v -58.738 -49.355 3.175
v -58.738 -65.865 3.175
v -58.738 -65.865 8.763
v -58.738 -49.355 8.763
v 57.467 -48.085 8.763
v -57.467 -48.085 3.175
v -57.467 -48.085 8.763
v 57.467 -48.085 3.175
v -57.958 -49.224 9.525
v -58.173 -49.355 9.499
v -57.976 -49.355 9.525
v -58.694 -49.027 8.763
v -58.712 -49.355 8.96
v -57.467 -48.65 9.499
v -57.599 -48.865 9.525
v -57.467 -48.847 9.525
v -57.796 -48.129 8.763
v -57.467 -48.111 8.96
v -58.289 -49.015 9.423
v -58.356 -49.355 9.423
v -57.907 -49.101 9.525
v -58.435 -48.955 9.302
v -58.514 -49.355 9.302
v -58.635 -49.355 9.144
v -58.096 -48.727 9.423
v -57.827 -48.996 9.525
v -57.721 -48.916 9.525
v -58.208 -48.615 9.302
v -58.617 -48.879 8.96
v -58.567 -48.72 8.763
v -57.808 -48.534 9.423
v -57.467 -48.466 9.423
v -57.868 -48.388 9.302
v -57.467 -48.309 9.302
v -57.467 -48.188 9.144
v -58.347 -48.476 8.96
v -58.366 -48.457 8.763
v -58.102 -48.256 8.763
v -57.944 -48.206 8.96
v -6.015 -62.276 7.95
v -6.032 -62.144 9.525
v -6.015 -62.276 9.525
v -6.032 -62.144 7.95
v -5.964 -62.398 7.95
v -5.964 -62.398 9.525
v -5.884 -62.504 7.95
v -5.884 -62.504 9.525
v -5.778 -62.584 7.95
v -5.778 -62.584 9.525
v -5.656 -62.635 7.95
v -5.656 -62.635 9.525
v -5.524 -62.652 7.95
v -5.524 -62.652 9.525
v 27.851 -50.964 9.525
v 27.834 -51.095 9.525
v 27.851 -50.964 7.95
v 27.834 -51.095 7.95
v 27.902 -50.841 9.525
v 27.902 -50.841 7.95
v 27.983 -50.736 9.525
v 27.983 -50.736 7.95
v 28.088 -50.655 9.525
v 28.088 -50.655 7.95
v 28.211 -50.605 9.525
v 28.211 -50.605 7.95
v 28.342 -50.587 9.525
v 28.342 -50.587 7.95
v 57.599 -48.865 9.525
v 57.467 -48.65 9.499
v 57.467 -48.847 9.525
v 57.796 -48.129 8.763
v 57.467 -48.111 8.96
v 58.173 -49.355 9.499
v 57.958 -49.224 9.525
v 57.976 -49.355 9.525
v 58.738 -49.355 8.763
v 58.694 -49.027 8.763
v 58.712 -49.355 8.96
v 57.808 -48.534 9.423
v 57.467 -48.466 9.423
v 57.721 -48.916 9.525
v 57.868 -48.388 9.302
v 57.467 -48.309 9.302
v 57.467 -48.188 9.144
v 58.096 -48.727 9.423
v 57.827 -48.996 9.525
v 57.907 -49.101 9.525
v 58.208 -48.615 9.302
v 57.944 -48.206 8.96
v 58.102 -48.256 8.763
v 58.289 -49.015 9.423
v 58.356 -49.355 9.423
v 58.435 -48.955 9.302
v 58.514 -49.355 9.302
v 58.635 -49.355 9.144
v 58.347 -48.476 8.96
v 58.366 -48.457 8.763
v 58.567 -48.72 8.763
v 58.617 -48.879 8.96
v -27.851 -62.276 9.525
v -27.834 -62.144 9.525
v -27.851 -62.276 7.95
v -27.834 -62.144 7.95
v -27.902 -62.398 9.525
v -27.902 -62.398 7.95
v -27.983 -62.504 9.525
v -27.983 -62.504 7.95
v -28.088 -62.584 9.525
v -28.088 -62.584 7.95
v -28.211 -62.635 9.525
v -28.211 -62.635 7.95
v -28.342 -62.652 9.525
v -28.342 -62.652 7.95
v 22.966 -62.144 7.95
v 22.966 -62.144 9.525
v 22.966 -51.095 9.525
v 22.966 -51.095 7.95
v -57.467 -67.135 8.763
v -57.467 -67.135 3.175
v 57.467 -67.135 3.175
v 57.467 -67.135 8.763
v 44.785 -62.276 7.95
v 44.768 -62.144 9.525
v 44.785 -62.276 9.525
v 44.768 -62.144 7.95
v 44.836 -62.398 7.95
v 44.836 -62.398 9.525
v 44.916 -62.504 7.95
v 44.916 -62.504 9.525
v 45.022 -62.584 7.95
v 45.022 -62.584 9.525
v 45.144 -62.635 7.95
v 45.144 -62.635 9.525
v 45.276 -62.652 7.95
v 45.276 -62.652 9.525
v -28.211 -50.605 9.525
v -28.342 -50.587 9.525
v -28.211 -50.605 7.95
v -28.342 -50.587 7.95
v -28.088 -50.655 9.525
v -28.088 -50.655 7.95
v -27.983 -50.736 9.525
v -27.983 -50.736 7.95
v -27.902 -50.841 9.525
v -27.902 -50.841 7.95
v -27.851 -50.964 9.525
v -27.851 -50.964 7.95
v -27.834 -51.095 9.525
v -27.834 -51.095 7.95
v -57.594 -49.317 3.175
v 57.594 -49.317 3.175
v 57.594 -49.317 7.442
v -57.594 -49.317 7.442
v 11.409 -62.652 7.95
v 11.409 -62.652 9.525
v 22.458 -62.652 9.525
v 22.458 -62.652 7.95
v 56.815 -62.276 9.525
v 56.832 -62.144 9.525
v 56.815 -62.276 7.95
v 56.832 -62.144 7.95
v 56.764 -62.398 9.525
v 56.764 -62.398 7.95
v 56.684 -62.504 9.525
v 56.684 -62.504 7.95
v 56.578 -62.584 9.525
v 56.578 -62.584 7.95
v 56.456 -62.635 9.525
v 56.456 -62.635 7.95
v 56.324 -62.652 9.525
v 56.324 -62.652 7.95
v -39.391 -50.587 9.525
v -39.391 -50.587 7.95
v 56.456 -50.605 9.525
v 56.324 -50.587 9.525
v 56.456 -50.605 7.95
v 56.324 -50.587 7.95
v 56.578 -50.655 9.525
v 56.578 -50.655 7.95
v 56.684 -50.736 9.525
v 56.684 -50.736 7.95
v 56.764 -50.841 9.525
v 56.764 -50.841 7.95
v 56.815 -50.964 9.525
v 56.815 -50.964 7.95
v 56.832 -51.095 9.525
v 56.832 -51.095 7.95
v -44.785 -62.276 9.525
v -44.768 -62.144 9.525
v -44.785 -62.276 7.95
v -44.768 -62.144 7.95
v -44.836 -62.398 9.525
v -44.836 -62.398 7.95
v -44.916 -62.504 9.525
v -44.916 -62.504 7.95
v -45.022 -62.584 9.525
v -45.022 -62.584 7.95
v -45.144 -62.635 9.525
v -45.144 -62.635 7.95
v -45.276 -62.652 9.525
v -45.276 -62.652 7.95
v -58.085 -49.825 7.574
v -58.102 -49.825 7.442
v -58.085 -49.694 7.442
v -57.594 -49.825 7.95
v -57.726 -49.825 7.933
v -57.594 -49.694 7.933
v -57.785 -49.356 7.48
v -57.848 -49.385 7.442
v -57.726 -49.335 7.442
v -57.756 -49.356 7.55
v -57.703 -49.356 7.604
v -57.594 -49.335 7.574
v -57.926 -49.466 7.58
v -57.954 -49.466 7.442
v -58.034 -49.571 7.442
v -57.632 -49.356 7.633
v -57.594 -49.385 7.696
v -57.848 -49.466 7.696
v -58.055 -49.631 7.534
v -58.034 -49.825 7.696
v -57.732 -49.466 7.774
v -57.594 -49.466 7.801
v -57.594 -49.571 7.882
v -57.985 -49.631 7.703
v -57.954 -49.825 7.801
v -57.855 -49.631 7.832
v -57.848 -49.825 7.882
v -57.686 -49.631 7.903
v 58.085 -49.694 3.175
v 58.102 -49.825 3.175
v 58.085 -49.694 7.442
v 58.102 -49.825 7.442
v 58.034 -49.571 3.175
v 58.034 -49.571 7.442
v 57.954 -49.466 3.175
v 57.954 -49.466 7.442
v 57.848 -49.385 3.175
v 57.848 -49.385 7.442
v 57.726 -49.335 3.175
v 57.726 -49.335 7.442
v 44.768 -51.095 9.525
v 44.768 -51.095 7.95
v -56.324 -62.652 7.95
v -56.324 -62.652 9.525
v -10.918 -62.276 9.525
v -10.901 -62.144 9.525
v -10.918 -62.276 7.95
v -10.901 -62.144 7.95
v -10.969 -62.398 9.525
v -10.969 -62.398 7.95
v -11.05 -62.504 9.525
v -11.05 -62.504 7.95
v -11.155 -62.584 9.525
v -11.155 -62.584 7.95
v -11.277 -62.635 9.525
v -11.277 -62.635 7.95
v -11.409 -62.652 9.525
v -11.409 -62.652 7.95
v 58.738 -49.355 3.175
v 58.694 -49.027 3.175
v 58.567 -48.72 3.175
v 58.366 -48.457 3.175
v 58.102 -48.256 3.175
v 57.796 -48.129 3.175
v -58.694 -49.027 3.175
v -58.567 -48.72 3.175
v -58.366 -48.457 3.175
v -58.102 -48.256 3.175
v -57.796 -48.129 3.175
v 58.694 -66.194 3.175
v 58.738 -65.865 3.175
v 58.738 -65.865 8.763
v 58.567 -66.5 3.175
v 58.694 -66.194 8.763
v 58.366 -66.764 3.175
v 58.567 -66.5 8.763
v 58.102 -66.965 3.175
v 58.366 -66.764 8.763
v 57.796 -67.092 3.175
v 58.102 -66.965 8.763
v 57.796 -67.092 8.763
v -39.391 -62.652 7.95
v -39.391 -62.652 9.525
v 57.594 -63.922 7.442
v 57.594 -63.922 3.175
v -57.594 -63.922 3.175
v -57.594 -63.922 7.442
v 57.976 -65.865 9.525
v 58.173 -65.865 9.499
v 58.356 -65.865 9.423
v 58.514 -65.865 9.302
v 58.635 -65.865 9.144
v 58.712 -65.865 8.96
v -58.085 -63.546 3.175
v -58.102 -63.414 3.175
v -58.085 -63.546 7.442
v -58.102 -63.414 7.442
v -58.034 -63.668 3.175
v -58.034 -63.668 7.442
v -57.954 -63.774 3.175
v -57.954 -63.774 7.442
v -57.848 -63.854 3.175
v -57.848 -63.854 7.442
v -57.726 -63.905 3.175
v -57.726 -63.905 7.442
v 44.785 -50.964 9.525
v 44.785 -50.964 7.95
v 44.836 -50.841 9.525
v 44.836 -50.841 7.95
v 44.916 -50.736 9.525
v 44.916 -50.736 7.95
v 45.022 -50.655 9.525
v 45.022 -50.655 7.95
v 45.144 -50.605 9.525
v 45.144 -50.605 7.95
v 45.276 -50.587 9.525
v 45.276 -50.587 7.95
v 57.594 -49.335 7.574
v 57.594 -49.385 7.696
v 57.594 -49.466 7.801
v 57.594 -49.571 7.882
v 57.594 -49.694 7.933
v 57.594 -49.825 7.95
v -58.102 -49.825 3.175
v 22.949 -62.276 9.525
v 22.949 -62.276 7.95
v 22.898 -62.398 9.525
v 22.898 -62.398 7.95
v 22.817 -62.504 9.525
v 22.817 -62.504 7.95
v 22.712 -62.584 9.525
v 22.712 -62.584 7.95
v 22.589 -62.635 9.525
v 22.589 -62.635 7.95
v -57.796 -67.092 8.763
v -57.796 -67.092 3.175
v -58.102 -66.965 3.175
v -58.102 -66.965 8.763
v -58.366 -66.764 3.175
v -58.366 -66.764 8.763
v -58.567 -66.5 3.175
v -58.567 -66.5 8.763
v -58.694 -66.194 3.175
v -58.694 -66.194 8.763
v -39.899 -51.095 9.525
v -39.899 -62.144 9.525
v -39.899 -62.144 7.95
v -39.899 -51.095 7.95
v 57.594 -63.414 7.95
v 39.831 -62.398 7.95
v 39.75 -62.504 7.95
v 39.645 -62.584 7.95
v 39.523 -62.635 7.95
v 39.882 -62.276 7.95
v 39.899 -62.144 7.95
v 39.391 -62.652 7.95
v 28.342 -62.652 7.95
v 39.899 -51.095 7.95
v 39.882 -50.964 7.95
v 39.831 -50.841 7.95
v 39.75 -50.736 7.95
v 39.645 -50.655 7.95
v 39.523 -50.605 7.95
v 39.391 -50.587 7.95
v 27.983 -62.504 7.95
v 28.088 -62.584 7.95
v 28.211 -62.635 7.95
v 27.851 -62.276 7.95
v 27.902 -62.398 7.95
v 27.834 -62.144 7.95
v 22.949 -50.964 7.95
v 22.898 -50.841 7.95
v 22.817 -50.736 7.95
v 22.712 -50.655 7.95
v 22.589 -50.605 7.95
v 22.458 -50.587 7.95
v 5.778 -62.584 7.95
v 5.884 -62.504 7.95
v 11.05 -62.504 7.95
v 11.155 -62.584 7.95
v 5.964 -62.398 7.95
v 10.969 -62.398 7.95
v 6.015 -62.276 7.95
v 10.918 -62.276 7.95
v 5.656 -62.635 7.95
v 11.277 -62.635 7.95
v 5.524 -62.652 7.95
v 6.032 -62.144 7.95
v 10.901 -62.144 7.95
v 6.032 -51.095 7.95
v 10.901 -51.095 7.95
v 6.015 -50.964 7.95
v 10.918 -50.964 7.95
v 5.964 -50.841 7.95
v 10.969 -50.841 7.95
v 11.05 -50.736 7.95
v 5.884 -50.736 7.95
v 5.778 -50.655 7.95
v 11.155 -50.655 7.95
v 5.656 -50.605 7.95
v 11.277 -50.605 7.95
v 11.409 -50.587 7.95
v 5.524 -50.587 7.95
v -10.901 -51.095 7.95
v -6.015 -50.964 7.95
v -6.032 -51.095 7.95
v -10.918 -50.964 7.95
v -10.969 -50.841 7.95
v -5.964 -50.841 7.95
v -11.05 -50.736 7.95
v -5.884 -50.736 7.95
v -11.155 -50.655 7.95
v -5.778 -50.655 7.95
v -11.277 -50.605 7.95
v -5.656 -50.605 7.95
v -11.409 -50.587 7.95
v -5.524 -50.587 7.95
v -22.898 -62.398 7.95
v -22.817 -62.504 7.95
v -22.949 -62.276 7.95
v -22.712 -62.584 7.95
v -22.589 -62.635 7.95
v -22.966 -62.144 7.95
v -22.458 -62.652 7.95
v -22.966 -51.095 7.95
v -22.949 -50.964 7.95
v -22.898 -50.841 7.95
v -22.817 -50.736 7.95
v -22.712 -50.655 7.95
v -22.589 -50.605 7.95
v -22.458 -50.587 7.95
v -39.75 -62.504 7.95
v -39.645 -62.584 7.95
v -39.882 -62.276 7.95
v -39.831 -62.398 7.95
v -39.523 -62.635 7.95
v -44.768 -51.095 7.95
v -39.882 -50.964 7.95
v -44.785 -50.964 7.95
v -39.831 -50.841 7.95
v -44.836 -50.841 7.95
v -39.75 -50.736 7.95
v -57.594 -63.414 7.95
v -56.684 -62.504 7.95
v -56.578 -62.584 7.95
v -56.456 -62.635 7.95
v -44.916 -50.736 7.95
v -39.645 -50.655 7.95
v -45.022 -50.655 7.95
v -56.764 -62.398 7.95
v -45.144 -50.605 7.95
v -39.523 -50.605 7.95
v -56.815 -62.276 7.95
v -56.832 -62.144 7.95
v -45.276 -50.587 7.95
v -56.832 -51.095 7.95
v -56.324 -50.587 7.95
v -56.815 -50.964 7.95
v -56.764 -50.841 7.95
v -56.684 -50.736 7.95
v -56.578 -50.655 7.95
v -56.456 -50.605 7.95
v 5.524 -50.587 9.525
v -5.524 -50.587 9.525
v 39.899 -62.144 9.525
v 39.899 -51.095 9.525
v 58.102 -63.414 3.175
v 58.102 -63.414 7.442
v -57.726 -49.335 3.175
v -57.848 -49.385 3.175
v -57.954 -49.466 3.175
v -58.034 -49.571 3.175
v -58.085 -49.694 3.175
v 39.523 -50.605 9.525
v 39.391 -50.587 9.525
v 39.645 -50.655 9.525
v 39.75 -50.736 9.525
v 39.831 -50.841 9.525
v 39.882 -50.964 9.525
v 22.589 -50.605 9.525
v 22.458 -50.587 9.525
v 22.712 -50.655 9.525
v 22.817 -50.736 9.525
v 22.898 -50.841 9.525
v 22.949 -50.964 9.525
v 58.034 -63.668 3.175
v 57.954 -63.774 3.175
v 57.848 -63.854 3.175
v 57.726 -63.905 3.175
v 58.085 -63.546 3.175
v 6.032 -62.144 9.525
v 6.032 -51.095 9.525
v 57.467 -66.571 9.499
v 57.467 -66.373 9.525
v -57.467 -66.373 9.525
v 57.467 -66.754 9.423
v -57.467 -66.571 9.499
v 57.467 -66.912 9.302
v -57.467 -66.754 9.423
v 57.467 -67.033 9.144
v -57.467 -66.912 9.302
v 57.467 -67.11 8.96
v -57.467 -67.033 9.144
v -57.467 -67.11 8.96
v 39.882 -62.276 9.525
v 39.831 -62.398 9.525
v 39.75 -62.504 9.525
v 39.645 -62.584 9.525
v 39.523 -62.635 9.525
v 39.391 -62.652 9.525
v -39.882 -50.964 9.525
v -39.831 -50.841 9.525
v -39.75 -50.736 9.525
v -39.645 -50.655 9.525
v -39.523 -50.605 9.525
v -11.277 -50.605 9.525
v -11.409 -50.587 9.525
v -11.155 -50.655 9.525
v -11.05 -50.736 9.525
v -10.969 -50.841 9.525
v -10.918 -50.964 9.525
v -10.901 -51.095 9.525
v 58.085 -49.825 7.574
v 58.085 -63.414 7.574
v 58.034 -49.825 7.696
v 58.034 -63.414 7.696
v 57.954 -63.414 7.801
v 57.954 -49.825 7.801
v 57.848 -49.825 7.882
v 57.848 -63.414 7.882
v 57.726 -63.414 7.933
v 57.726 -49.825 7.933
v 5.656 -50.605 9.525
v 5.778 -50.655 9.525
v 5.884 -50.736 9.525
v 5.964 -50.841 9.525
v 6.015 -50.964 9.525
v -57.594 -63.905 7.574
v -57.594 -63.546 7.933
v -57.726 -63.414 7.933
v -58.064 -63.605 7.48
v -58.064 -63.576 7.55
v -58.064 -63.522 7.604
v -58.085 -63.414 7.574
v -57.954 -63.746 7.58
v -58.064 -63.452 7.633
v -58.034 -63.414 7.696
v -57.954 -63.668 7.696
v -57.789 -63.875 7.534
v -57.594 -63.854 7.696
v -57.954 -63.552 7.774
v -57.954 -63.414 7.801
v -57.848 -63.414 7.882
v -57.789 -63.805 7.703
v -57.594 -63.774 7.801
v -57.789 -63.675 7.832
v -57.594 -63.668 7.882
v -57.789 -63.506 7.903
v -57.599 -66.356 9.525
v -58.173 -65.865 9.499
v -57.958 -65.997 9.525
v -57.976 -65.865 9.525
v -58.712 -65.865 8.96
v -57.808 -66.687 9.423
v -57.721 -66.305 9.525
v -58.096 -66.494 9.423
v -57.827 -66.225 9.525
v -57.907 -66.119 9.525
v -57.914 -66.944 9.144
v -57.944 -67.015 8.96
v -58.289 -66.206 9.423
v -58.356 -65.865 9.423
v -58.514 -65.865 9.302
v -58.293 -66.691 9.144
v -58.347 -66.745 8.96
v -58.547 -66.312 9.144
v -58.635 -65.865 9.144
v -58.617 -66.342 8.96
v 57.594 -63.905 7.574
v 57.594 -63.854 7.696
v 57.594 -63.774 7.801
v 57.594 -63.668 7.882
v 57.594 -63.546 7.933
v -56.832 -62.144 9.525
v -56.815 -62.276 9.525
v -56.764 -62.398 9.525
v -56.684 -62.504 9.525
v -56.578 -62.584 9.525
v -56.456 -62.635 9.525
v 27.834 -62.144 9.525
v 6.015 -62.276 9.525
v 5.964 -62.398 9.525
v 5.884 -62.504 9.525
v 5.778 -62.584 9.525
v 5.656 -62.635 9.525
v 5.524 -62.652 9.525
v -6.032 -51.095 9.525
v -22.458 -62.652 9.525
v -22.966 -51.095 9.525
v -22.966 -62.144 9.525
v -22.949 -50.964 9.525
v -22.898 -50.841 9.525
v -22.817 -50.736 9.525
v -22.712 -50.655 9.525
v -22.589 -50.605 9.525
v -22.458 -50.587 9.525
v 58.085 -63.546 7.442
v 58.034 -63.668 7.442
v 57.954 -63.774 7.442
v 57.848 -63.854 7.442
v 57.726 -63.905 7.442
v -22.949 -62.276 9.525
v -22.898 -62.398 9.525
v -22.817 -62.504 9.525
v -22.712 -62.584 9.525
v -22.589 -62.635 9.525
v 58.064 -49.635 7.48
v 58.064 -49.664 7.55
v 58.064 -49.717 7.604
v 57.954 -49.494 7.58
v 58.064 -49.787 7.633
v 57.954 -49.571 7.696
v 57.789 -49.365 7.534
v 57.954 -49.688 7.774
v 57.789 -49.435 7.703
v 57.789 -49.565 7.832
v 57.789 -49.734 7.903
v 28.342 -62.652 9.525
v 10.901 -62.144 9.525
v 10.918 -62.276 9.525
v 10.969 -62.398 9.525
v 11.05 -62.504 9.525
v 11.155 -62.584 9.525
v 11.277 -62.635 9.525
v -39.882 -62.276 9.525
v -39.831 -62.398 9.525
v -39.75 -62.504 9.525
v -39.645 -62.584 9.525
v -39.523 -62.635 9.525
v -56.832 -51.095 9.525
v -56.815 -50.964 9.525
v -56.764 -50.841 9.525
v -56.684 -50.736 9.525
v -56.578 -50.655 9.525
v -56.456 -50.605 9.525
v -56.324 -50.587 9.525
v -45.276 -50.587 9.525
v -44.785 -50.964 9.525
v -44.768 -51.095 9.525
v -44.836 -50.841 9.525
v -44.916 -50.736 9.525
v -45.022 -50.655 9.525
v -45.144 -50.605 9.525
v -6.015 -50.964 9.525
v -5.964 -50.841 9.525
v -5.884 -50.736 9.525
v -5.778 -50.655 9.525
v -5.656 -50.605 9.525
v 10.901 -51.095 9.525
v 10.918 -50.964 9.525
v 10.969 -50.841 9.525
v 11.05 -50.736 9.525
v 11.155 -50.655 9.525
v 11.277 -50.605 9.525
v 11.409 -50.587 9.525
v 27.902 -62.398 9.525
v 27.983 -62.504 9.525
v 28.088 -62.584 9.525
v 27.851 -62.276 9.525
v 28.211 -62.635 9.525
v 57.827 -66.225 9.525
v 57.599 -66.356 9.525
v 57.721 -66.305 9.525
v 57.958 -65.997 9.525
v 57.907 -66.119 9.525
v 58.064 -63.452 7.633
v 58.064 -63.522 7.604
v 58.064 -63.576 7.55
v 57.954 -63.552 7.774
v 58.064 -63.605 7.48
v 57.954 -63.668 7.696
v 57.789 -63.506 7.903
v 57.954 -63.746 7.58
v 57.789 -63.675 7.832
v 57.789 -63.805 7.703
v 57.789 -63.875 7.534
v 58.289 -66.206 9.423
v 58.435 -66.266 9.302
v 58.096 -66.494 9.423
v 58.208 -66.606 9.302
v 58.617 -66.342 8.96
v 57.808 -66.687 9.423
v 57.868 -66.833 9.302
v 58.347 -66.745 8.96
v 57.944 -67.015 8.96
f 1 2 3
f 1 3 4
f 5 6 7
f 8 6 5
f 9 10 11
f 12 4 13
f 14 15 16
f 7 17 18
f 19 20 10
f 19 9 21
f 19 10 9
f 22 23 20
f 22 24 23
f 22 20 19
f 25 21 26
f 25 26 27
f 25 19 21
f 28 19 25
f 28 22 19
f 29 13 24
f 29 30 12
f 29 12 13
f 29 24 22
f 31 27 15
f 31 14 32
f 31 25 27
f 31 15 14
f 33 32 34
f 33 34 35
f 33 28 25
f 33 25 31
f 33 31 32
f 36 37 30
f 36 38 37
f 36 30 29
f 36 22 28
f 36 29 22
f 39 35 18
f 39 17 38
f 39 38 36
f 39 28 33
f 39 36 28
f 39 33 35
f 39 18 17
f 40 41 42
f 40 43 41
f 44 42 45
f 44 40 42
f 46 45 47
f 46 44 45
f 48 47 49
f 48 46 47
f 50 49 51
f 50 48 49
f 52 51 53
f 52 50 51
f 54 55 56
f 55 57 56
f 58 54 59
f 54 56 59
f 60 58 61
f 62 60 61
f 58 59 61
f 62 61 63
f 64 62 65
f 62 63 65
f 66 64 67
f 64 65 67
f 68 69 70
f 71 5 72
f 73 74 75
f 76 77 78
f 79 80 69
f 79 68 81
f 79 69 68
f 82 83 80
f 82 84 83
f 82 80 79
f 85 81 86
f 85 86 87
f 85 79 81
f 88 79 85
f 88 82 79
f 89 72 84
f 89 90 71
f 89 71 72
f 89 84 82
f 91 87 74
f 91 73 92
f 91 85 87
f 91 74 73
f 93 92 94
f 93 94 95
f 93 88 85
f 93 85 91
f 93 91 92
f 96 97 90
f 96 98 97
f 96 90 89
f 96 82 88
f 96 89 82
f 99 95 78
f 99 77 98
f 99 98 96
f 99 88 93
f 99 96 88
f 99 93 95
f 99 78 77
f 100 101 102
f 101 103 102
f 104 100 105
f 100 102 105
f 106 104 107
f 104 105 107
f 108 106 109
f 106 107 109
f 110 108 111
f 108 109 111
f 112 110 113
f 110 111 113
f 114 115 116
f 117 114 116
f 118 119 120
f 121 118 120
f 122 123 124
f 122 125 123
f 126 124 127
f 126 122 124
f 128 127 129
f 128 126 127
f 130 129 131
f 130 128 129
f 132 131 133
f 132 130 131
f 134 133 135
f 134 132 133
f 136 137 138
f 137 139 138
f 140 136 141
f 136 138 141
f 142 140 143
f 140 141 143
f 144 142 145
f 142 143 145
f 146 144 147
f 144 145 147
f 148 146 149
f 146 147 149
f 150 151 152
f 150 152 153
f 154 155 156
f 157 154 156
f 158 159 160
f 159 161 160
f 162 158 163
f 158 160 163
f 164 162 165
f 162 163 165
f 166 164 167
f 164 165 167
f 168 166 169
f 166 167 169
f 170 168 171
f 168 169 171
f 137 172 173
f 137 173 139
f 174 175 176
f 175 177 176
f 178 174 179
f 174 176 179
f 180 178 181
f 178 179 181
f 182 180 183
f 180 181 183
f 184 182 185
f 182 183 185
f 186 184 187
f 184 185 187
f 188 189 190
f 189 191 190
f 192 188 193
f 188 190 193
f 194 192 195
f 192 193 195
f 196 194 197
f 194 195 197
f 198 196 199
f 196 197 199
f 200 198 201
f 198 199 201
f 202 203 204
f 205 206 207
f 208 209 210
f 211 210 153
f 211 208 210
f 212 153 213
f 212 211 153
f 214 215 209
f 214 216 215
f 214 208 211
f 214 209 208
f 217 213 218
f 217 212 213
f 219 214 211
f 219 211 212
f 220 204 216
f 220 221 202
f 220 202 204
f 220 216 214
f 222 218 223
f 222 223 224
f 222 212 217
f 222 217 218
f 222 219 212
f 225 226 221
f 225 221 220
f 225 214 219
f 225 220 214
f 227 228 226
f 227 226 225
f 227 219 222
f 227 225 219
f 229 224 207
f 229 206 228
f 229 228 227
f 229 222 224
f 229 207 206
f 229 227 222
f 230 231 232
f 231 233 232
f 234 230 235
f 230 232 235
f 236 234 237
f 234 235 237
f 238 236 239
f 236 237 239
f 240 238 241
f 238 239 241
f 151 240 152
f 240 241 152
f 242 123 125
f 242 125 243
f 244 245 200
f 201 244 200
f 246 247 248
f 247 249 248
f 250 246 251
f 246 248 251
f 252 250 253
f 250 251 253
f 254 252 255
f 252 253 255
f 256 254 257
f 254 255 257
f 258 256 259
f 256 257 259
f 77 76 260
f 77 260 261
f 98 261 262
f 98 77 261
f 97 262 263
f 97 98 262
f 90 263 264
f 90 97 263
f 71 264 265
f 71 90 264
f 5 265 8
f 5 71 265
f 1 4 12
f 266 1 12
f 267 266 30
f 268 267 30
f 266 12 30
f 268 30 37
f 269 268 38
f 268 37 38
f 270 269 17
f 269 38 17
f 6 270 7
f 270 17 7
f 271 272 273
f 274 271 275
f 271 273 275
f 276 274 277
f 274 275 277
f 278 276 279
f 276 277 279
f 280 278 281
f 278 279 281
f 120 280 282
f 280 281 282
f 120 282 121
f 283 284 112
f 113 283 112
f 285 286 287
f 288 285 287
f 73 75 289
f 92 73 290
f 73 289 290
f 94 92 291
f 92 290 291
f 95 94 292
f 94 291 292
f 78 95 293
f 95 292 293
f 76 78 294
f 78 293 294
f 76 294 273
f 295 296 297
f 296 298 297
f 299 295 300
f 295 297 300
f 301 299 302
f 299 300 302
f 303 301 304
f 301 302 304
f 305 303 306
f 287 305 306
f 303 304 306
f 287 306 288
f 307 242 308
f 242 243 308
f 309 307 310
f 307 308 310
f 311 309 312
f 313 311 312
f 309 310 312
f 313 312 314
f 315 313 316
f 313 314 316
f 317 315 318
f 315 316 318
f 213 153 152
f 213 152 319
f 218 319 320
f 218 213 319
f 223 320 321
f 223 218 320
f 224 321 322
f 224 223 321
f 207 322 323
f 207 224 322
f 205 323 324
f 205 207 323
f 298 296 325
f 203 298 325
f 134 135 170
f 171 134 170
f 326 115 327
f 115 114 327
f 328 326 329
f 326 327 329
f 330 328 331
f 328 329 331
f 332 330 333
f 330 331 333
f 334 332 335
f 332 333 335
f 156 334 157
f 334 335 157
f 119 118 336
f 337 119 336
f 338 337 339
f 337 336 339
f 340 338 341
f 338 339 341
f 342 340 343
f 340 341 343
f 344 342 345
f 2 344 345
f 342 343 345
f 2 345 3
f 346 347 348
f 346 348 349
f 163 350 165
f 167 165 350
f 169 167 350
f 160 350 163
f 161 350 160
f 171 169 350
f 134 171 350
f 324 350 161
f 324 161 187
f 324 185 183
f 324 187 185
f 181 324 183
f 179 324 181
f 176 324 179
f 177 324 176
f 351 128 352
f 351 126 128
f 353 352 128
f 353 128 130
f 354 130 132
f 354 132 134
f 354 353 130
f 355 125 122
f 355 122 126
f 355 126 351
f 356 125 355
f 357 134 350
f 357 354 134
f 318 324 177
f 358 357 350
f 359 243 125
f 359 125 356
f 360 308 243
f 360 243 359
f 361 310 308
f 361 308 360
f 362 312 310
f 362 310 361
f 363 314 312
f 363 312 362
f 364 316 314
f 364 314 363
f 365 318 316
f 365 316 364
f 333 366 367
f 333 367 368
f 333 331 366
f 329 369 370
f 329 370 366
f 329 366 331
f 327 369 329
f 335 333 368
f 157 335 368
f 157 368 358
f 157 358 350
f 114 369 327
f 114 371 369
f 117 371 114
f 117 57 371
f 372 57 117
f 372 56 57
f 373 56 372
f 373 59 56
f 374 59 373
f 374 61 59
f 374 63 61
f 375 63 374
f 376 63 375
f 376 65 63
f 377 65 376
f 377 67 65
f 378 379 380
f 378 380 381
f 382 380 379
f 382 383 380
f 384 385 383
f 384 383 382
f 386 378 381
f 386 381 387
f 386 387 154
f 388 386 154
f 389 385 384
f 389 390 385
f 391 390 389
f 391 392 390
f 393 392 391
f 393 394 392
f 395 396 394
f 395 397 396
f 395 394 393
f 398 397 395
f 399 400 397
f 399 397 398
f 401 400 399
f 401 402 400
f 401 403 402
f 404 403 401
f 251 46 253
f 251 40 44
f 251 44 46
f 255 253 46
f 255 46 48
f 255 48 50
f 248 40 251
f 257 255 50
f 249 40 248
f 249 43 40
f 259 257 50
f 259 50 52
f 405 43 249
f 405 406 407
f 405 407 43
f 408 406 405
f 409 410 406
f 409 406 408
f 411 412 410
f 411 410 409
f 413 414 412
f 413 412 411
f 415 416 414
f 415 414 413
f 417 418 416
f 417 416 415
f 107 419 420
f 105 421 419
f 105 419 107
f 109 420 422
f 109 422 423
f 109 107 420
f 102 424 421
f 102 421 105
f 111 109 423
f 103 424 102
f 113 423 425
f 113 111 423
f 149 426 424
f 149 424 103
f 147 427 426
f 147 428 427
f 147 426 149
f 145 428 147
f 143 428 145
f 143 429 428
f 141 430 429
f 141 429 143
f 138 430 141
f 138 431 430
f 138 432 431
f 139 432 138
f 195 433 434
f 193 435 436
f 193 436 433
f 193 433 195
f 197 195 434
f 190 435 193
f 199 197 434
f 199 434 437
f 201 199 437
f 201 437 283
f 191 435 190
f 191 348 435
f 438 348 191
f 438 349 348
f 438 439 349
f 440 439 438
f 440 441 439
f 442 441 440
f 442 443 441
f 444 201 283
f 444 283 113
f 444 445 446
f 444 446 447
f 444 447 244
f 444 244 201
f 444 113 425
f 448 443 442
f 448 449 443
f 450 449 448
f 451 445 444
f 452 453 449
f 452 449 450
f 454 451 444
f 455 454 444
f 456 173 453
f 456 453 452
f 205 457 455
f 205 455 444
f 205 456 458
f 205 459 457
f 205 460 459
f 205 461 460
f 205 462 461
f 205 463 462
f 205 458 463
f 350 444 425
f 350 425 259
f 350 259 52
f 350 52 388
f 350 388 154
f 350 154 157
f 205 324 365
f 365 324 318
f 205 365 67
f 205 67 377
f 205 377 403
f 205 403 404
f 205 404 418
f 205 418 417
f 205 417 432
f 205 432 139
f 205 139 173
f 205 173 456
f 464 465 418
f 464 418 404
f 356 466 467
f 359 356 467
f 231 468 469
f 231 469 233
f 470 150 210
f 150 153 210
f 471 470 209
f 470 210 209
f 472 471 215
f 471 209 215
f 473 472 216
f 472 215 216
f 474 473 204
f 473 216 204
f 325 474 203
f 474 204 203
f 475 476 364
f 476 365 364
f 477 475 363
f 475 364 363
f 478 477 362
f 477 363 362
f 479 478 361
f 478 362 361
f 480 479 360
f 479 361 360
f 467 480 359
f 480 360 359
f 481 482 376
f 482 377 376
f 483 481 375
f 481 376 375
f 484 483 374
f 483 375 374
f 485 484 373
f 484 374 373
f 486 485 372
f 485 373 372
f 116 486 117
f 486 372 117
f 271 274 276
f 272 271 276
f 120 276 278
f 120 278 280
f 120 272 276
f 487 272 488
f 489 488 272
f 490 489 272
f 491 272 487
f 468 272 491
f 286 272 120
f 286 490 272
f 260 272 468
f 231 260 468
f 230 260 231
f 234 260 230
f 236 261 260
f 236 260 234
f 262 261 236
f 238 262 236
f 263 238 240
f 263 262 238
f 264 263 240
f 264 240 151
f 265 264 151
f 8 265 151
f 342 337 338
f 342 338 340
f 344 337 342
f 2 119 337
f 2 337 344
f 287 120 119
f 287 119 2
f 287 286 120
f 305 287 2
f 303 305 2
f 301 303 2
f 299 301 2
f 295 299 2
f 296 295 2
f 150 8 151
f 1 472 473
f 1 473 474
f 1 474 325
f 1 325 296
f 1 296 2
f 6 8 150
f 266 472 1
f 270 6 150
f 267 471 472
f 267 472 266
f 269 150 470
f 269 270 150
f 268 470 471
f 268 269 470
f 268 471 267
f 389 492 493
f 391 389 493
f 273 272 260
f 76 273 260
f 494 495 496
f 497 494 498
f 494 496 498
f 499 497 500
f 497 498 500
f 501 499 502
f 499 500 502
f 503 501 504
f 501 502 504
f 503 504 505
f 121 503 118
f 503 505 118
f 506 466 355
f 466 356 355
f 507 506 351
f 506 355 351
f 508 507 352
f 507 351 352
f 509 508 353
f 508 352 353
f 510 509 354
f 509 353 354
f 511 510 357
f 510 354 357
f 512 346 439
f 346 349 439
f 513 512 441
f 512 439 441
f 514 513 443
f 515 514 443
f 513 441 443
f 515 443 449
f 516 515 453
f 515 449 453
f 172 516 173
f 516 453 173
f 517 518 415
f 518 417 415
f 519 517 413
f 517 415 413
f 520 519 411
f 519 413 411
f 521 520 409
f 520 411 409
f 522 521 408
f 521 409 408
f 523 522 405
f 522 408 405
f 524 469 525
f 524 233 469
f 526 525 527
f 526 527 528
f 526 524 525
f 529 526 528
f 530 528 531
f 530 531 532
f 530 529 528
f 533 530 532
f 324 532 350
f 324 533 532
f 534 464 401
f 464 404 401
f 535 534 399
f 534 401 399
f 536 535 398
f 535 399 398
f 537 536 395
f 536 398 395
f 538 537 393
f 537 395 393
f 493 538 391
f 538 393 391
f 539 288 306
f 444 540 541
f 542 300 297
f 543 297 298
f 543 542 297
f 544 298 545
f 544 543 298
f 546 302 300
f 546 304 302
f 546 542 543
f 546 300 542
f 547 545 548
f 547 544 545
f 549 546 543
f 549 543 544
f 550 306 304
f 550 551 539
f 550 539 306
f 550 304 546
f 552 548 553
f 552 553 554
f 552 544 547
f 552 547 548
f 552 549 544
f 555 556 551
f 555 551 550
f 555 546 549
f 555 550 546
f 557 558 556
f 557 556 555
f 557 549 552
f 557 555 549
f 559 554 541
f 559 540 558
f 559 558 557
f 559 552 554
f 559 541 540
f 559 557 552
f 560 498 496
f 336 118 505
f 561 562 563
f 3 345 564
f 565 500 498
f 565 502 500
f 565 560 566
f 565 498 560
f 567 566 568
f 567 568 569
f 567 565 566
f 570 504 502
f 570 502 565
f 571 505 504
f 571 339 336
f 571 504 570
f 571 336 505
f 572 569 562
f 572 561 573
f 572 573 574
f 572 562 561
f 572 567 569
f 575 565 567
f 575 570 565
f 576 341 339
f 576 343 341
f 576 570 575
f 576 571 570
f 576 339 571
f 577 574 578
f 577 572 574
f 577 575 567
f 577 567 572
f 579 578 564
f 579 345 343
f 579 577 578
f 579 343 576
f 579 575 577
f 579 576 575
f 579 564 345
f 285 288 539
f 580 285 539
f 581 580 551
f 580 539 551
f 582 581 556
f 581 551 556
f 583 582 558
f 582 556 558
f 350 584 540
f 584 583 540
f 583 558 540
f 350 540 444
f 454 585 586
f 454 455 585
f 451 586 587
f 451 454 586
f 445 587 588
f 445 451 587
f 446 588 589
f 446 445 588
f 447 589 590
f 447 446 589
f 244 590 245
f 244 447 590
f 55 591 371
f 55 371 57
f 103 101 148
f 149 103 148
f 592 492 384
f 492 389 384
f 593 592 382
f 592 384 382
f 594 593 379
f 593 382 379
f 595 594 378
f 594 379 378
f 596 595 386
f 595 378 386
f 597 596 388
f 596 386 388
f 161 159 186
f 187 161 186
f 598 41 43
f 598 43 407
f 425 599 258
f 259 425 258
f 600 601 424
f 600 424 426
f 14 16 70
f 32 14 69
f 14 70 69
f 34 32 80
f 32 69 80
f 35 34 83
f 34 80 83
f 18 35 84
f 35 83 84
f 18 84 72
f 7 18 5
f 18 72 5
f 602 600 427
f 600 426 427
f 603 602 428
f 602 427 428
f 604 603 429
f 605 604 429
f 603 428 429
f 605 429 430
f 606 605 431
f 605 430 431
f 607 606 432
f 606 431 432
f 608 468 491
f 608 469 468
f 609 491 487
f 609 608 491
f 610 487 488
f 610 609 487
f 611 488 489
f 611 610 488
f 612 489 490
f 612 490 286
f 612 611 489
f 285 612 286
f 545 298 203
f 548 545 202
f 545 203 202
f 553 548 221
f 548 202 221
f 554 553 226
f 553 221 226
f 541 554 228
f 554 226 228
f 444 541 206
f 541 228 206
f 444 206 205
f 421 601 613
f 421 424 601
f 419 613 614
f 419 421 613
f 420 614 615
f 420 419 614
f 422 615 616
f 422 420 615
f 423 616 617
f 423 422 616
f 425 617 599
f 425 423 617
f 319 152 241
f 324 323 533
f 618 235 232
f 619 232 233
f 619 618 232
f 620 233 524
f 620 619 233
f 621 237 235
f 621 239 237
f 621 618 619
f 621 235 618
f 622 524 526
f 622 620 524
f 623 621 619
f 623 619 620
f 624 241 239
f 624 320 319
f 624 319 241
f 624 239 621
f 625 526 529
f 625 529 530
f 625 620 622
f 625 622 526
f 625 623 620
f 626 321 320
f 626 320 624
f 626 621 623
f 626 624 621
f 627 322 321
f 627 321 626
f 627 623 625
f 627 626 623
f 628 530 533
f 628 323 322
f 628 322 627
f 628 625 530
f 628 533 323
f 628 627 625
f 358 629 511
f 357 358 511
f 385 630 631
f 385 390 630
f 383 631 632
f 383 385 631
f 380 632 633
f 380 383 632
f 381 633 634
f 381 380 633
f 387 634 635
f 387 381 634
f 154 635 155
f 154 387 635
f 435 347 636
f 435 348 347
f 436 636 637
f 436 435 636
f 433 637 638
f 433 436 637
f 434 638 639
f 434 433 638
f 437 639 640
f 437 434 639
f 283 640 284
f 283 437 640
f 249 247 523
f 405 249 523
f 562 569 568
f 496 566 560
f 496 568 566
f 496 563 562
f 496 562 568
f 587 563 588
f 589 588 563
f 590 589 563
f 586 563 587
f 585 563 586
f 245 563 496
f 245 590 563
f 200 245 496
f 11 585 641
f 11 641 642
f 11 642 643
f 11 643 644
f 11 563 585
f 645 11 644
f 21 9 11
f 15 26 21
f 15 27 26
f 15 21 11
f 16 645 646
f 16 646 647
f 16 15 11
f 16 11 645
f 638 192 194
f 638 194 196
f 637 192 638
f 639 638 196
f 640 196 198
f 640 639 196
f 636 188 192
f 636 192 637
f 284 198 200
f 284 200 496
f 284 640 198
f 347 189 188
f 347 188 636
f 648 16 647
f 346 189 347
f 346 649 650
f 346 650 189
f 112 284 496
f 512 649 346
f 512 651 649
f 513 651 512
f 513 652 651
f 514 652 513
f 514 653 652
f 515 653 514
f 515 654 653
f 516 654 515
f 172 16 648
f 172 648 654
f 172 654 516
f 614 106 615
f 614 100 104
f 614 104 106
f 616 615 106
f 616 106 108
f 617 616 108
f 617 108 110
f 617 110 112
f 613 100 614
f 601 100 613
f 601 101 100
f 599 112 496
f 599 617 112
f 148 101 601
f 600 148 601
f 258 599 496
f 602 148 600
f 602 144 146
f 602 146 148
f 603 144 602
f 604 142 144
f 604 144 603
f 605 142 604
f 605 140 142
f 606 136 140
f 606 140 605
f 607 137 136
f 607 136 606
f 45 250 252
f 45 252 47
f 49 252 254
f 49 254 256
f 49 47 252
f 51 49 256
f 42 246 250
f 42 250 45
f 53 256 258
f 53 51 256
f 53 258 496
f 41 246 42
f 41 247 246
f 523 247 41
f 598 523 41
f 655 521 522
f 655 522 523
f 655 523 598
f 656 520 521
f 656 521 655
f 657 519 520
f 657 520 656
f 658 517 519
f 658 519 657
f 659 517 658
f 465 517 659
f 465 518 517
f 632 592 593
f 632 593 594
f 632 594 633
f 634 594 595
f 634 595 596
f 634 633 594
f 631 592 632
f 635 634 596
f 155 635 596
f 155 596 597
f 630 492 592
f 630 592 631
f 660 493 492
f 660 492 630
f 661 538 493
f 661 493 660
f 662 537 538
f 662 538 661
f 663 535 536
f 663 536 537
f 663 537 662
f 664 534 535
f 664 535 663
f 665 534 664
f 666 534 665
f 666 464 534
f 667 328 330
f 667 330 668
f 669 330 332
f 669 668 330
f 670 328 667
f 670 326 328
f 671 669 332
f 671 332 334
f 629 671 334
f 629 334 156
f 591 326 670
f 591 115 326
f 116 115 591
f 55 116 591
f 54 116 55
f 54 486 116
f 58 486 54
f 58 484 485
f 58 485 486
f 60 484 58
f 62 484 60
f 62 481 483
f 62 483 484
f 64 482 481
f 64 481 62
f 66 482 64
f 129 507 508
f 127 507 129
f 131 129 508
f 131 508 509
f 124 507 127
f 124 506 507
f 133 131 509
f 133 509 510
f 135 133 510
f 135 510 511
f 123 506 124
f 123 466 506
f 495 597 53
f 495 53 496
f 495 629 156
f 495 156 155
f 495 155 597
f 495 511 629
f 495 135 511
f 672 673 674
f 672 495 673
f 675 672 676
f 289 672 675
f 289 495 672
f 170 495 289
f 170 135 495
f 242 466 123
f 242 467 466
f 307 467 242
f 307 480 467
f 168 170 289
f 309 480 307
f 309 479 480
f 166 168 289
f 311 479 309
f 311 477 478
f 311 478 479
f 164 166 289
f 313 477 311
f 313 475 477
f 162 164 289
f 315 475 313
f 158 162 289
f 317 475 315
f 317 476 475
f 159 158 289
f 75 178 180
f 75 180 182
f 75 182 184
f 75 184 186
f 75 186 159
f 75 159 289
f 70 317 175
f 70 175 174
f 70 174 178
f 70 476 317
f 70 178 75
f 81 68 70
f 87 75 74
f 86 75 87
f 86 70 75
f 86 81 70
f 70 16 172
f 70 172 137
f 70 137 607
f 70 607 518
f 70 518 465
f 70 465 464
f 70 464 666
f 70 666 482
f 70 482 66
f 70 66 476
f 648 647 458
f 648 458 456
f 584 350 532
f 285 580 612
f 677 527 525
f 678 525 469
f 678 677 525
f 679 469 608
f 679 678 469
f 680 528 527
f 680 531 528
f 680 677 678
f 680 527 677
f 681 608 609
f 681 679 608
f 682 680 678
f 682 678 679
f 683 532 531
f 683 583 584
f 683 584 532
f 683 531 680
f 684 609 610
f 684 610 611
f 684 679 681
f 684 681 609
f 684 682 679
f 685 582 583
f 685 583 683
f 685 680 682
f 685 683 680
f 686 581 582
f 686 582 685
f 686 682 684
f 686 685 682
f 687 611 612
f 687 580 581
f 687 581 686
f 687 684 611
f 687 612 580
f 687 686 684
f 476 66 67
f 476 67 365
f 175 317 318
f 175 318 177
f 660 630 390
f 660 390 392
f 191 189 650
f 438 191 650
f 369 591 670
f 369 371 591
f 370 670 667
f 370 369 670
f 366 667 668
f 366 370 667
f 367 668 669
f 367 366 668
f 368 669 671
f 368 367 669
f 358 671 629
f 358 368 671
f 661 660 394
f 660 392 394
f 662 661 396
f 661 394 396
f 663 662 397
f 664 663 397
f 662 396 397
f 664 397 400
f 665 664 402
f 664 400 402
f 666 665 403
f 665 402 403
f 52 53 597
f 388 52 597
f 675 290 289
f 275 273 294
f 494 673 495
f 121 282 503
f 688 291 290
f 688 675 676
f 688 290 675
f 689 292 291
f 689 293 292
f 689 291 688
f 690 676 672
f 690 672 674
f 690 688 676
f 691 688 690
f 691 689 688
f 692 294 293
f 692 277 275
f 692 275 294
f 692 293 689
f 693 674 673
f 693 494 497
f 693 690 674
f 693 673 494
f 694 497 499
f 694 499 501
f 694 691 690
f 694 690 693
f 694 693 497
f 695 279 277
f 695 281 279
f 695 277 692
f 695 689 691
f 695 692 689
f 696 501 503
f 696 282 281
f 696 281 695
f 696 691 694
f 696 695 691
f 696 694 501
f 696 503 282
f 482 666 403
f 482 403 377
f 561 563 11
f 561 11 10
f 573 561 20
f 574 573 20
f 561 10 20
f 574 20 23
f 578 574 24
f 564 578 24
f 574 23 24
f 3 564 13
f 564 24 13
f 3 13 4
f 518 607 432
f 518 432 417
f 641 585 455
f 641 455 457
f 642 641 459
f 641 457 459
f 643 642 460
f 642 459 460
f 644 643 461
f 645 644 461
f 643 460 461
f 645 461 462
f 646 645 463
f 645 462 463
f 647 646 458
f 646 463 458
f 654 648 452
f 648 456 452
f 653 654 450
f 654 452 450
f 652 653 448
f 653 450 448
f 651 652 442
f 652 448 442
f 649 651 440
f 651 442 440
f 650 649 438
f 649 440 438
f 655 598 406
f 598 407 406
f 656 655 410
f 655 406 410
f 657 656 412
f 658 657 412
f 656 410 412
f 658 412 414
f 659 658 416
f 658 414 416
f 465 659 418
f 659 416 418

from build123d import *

# Parameters (mm, degrees)
SKETCH1_W             = 117.475
SKETCH1_H             = 19.05
BOSS_EXTRUDE1_DEPTH   = 9.525
BOSS_EXTRUDE2_DEPTH   = 3.175
F_6_CLEARANCE_HOLE1_D = 4.3053
SKETCH5_W             = 12.065
SKETCH5_H             = 12.065
CUT_EXTRUDE1_DEPTH    = 10.525
SKETCH7_W             = 116.205
SKETCH7_H             = 14.605
CUT_EXTRUDE2_DEPTH    = 7.9502
SKETCH8_W             = 117.475
SKETCH8_H             = 28.575
CUT_EXTRUDE3_DEPTH    = 3.175
FILLET2_R             = 1.27
FILLET3_R             = 0.762
FILLET4_R             = 0.508
FILLET5_R             = 0.508


with BuildPart() as part:
    # Sketch1 → Boss-Extrude1 (new body)
    with BuildSketch(Plane.XY):
        with Locations((0, -57.6104797)):
            Rectangle(SKETCH1_W, SKETCH1_H)
    extrude(amount=BOSS_EXTRUDE1_DEPTH)

    # Sketch2 → Boss-Extrude2 (add)
    with BuildSketch(Plane.XY):
        with BuildLine():
            Line((35.56, -48.0854797), (58.7375, -48.0854797))
            Line((58.7375, -48.0854797), (44.939976119, -39.26086832))
            ThreePointArc((44.939976119, -39.26086832), (40.410479427, -39.106525106), (38.1, -43.0054797))
            Line((38.1, -43.0054797), (38.1, -45.5454797))
            ThreePointArc((38.1, -45.5454797), (37.356051224, -47.341530924), (35.56, -48.0854797))
        make_face()
        with BuildLine():
            Line((-38.1, -45.5454797), (-38.1, -43.0054797))
            ThreePointArc((-38.1, -43.0054797), (-40.410479427, -39.106525106), (-44.939976119, -39.26086832))
            Line((-44.939976119, -39.26086832), (-58.7375, -48.0854797))
            Line((-58.7375, -48.0854797), (-35.56, -48.0854797))
            ThreePointArc((-35.56, -48.0854797), (-37.356051224, -47.341530924), (-38.1, -45.5454797))
        make_face()
    extrude(amount=BOSS_EXTRUDE2_DEPTH)

    # #6 Clearance Hole1 (through all)
    with Locations(Plane.XY.offset(3.175)):
        with Locations((42.545, -43.0054797), (-42.545, -43.0054797)):
            Hole(F_6_CLEARANCE_HOLE1_D / 2)

    # Sketch5 → Cut-Extrude1 (cut, through all)
    with BuildSketch(Plane.XY.offset(9.525)):
        with Locations((50.8, -56.6198797)):
            Rectangle(SKETCH5_W, SKETCH5_H)
        with Locations((33.866666667, -56.6198797)):
            Rectangle(SKETCH5_W, SKETCH5_H)
        with Locations((16.933333333, -56.6198797)):
            Rectangle(SKETCH5_W, SKETCH5_H)
        with Locations((0, -56.6198797)):
            Rectangle(SKETCH5_W, SKETCH5_H)
        with Locations((-16.933333333, -56.6198797)):
            Rectangle(SKETCH5_W, SKETCH5_H)
        with Locations((-33.866666667, -56.6198797)):
            Rectangle(SKETCH5_W, SKETCH5_H)
        with Locations((-50.8, -56.6198797)):
            Rectangle(SKETCH5_W, SKETCH5_H)
    extrude(amount=-CUT_EXTRUDE1_DEPTH, mode=Mode.SUBTRACT)

    # Sketch7 → Cut-Extrude2 (cut)
    with BuildSketch(Plane(origin=(0, 0, 0), x_dir=(-1, 0, 0), z_dir=(0, 0, -1))):
        with Locations((0, -56.6198797)):
            Rectangle(SKETCH7_W, SKETCH7_H)
    extrude(amount=-CUT_EXTRUDE2_DEPTH, mode=Mode.SUBTRACT)

    # Sketch8 → Cut-Extrude3 (cut)
    with BuildSketch(Plane(origin=(0, 0, 0), x_dir=(-1, 0, 0), z_dir=(0, 0, -1))):
        with Locations((0, -52.8479797)):
            Rectangle(SKETCH8_W, SKETCH8_H)
    extrude(amount=-CUT_EXTRUDE3_DEPTH, mode=Mode.SUBTRACT)

    # Fillet2
    fillet2_edges = [part.edges().sort_by_distance(p)[0] for p in [
        (58.7375, -67.1354797, 6.35),
        (58.7375, -48.0854797, 6.35),
        (-58.7375, -48.0854797, 6.35),
        (-58.7375, -67.1354797, 6.35),
    ]]
    fillet(fillet2_edges, radius=FILLET2_R)

    # Fillet3
    fillet3_edges = [part.edges().sort_by_distance(p)[0] for p in [
        (-58.7375, -57.6104797, 9.525),
        (0, -48.0854797, 9.525),
        (0, -67.1354797, 9.525),
        (58.7375, -57.6104797, 9.525),
        (58.365525612, -66.763505312, 9.525),
        (58.365525612, -48.457454088, 9.525),
        (-58.365525612, -66.763505312, 9.525),
        (-58.365525612, -48.457454088, 9.525),
    ]]
    fillet(fillet3_edges, radius=FILLET3_R)

    # Fillet4
    fillet4_edges = [part.edges().sort_by_distance(p)[0] for p in [
        (0, -63.9223797, 7.9502),
        (-58.1025, -63.9223797, 5.5626),
        (-58.1025, -56.6198797, 7.9502),
        (-58.1025, -49.3173797, 5.5626),
        (0, -49.3173797, 7.9502),
        (58.1025, -49.3173797, 5.5626),
        (58.1025, -56.6198797, 7.9502),
        (58.1025, -63.9223797, 5.5626),
    ]]
    fillet(fillet4_edges, radius=FILLET4_R)

    # Fillet5
    fillet5_edges = [part.edges().sort_by_distance(p)[0] for p in [
        (-56.8325, -50.5873797, 8.7376),
        (-44.7675, -50.5873797, 8.7376),
        (-56.8325, -62.6523797, 8.7376),
        (-44.7675, -62.6523797, 8.7376),
        (-39.899166667, -50.5873797, 8.7376),
        (-27.834166667, -50.5873797, 8.7376),
        (-39.899166667, -62.6523797, 8.7376),
        (-27.834166667, -62.6523797, 8.7376),
        (-22.965833333, -50.5873797, 8.7376),
        (-10.900833333, -50.5873797, 8.7376),
        (-22.965833333, -62.6523797, 8.7376),
        (-10.900833333, -62.6523797, 8.7376),
        (-6.0325, -50.5873797, 8.7376),
        (6.0325, -50.5873797, 8.7376),
        (-6.0325, -62.6523797, 8.7376),
        (6.0325, -62.6523797, 8.7376),
        (10.900833333, -62.6523797, 8.7376),
        (10.900833333, -50.5873797, 8.7376),
        (22.965833333, -62.6523797, 8.7376),
        (22.965833333, -50.5873797, 8.7376),
        (39.899166667, -50.5873797, 8.7376),
        (39.899166667, -62.6523797, 8.7376),
        (27.834166667, -50.5873797, 8.7376),
        (27.834166667, -62.6523797, 8.7376),
        (44.7675, -50.5873797, 8.7376),
        (56.8325, -50.5873797, 8.7376),
        (44.7675, -62.6523797, 8.7376),
        (56.8325, -62.6523797, 8.7376),
    ]]
    fillet(fillet5_edges, radius=FILLET5_R)


solid = part.part
